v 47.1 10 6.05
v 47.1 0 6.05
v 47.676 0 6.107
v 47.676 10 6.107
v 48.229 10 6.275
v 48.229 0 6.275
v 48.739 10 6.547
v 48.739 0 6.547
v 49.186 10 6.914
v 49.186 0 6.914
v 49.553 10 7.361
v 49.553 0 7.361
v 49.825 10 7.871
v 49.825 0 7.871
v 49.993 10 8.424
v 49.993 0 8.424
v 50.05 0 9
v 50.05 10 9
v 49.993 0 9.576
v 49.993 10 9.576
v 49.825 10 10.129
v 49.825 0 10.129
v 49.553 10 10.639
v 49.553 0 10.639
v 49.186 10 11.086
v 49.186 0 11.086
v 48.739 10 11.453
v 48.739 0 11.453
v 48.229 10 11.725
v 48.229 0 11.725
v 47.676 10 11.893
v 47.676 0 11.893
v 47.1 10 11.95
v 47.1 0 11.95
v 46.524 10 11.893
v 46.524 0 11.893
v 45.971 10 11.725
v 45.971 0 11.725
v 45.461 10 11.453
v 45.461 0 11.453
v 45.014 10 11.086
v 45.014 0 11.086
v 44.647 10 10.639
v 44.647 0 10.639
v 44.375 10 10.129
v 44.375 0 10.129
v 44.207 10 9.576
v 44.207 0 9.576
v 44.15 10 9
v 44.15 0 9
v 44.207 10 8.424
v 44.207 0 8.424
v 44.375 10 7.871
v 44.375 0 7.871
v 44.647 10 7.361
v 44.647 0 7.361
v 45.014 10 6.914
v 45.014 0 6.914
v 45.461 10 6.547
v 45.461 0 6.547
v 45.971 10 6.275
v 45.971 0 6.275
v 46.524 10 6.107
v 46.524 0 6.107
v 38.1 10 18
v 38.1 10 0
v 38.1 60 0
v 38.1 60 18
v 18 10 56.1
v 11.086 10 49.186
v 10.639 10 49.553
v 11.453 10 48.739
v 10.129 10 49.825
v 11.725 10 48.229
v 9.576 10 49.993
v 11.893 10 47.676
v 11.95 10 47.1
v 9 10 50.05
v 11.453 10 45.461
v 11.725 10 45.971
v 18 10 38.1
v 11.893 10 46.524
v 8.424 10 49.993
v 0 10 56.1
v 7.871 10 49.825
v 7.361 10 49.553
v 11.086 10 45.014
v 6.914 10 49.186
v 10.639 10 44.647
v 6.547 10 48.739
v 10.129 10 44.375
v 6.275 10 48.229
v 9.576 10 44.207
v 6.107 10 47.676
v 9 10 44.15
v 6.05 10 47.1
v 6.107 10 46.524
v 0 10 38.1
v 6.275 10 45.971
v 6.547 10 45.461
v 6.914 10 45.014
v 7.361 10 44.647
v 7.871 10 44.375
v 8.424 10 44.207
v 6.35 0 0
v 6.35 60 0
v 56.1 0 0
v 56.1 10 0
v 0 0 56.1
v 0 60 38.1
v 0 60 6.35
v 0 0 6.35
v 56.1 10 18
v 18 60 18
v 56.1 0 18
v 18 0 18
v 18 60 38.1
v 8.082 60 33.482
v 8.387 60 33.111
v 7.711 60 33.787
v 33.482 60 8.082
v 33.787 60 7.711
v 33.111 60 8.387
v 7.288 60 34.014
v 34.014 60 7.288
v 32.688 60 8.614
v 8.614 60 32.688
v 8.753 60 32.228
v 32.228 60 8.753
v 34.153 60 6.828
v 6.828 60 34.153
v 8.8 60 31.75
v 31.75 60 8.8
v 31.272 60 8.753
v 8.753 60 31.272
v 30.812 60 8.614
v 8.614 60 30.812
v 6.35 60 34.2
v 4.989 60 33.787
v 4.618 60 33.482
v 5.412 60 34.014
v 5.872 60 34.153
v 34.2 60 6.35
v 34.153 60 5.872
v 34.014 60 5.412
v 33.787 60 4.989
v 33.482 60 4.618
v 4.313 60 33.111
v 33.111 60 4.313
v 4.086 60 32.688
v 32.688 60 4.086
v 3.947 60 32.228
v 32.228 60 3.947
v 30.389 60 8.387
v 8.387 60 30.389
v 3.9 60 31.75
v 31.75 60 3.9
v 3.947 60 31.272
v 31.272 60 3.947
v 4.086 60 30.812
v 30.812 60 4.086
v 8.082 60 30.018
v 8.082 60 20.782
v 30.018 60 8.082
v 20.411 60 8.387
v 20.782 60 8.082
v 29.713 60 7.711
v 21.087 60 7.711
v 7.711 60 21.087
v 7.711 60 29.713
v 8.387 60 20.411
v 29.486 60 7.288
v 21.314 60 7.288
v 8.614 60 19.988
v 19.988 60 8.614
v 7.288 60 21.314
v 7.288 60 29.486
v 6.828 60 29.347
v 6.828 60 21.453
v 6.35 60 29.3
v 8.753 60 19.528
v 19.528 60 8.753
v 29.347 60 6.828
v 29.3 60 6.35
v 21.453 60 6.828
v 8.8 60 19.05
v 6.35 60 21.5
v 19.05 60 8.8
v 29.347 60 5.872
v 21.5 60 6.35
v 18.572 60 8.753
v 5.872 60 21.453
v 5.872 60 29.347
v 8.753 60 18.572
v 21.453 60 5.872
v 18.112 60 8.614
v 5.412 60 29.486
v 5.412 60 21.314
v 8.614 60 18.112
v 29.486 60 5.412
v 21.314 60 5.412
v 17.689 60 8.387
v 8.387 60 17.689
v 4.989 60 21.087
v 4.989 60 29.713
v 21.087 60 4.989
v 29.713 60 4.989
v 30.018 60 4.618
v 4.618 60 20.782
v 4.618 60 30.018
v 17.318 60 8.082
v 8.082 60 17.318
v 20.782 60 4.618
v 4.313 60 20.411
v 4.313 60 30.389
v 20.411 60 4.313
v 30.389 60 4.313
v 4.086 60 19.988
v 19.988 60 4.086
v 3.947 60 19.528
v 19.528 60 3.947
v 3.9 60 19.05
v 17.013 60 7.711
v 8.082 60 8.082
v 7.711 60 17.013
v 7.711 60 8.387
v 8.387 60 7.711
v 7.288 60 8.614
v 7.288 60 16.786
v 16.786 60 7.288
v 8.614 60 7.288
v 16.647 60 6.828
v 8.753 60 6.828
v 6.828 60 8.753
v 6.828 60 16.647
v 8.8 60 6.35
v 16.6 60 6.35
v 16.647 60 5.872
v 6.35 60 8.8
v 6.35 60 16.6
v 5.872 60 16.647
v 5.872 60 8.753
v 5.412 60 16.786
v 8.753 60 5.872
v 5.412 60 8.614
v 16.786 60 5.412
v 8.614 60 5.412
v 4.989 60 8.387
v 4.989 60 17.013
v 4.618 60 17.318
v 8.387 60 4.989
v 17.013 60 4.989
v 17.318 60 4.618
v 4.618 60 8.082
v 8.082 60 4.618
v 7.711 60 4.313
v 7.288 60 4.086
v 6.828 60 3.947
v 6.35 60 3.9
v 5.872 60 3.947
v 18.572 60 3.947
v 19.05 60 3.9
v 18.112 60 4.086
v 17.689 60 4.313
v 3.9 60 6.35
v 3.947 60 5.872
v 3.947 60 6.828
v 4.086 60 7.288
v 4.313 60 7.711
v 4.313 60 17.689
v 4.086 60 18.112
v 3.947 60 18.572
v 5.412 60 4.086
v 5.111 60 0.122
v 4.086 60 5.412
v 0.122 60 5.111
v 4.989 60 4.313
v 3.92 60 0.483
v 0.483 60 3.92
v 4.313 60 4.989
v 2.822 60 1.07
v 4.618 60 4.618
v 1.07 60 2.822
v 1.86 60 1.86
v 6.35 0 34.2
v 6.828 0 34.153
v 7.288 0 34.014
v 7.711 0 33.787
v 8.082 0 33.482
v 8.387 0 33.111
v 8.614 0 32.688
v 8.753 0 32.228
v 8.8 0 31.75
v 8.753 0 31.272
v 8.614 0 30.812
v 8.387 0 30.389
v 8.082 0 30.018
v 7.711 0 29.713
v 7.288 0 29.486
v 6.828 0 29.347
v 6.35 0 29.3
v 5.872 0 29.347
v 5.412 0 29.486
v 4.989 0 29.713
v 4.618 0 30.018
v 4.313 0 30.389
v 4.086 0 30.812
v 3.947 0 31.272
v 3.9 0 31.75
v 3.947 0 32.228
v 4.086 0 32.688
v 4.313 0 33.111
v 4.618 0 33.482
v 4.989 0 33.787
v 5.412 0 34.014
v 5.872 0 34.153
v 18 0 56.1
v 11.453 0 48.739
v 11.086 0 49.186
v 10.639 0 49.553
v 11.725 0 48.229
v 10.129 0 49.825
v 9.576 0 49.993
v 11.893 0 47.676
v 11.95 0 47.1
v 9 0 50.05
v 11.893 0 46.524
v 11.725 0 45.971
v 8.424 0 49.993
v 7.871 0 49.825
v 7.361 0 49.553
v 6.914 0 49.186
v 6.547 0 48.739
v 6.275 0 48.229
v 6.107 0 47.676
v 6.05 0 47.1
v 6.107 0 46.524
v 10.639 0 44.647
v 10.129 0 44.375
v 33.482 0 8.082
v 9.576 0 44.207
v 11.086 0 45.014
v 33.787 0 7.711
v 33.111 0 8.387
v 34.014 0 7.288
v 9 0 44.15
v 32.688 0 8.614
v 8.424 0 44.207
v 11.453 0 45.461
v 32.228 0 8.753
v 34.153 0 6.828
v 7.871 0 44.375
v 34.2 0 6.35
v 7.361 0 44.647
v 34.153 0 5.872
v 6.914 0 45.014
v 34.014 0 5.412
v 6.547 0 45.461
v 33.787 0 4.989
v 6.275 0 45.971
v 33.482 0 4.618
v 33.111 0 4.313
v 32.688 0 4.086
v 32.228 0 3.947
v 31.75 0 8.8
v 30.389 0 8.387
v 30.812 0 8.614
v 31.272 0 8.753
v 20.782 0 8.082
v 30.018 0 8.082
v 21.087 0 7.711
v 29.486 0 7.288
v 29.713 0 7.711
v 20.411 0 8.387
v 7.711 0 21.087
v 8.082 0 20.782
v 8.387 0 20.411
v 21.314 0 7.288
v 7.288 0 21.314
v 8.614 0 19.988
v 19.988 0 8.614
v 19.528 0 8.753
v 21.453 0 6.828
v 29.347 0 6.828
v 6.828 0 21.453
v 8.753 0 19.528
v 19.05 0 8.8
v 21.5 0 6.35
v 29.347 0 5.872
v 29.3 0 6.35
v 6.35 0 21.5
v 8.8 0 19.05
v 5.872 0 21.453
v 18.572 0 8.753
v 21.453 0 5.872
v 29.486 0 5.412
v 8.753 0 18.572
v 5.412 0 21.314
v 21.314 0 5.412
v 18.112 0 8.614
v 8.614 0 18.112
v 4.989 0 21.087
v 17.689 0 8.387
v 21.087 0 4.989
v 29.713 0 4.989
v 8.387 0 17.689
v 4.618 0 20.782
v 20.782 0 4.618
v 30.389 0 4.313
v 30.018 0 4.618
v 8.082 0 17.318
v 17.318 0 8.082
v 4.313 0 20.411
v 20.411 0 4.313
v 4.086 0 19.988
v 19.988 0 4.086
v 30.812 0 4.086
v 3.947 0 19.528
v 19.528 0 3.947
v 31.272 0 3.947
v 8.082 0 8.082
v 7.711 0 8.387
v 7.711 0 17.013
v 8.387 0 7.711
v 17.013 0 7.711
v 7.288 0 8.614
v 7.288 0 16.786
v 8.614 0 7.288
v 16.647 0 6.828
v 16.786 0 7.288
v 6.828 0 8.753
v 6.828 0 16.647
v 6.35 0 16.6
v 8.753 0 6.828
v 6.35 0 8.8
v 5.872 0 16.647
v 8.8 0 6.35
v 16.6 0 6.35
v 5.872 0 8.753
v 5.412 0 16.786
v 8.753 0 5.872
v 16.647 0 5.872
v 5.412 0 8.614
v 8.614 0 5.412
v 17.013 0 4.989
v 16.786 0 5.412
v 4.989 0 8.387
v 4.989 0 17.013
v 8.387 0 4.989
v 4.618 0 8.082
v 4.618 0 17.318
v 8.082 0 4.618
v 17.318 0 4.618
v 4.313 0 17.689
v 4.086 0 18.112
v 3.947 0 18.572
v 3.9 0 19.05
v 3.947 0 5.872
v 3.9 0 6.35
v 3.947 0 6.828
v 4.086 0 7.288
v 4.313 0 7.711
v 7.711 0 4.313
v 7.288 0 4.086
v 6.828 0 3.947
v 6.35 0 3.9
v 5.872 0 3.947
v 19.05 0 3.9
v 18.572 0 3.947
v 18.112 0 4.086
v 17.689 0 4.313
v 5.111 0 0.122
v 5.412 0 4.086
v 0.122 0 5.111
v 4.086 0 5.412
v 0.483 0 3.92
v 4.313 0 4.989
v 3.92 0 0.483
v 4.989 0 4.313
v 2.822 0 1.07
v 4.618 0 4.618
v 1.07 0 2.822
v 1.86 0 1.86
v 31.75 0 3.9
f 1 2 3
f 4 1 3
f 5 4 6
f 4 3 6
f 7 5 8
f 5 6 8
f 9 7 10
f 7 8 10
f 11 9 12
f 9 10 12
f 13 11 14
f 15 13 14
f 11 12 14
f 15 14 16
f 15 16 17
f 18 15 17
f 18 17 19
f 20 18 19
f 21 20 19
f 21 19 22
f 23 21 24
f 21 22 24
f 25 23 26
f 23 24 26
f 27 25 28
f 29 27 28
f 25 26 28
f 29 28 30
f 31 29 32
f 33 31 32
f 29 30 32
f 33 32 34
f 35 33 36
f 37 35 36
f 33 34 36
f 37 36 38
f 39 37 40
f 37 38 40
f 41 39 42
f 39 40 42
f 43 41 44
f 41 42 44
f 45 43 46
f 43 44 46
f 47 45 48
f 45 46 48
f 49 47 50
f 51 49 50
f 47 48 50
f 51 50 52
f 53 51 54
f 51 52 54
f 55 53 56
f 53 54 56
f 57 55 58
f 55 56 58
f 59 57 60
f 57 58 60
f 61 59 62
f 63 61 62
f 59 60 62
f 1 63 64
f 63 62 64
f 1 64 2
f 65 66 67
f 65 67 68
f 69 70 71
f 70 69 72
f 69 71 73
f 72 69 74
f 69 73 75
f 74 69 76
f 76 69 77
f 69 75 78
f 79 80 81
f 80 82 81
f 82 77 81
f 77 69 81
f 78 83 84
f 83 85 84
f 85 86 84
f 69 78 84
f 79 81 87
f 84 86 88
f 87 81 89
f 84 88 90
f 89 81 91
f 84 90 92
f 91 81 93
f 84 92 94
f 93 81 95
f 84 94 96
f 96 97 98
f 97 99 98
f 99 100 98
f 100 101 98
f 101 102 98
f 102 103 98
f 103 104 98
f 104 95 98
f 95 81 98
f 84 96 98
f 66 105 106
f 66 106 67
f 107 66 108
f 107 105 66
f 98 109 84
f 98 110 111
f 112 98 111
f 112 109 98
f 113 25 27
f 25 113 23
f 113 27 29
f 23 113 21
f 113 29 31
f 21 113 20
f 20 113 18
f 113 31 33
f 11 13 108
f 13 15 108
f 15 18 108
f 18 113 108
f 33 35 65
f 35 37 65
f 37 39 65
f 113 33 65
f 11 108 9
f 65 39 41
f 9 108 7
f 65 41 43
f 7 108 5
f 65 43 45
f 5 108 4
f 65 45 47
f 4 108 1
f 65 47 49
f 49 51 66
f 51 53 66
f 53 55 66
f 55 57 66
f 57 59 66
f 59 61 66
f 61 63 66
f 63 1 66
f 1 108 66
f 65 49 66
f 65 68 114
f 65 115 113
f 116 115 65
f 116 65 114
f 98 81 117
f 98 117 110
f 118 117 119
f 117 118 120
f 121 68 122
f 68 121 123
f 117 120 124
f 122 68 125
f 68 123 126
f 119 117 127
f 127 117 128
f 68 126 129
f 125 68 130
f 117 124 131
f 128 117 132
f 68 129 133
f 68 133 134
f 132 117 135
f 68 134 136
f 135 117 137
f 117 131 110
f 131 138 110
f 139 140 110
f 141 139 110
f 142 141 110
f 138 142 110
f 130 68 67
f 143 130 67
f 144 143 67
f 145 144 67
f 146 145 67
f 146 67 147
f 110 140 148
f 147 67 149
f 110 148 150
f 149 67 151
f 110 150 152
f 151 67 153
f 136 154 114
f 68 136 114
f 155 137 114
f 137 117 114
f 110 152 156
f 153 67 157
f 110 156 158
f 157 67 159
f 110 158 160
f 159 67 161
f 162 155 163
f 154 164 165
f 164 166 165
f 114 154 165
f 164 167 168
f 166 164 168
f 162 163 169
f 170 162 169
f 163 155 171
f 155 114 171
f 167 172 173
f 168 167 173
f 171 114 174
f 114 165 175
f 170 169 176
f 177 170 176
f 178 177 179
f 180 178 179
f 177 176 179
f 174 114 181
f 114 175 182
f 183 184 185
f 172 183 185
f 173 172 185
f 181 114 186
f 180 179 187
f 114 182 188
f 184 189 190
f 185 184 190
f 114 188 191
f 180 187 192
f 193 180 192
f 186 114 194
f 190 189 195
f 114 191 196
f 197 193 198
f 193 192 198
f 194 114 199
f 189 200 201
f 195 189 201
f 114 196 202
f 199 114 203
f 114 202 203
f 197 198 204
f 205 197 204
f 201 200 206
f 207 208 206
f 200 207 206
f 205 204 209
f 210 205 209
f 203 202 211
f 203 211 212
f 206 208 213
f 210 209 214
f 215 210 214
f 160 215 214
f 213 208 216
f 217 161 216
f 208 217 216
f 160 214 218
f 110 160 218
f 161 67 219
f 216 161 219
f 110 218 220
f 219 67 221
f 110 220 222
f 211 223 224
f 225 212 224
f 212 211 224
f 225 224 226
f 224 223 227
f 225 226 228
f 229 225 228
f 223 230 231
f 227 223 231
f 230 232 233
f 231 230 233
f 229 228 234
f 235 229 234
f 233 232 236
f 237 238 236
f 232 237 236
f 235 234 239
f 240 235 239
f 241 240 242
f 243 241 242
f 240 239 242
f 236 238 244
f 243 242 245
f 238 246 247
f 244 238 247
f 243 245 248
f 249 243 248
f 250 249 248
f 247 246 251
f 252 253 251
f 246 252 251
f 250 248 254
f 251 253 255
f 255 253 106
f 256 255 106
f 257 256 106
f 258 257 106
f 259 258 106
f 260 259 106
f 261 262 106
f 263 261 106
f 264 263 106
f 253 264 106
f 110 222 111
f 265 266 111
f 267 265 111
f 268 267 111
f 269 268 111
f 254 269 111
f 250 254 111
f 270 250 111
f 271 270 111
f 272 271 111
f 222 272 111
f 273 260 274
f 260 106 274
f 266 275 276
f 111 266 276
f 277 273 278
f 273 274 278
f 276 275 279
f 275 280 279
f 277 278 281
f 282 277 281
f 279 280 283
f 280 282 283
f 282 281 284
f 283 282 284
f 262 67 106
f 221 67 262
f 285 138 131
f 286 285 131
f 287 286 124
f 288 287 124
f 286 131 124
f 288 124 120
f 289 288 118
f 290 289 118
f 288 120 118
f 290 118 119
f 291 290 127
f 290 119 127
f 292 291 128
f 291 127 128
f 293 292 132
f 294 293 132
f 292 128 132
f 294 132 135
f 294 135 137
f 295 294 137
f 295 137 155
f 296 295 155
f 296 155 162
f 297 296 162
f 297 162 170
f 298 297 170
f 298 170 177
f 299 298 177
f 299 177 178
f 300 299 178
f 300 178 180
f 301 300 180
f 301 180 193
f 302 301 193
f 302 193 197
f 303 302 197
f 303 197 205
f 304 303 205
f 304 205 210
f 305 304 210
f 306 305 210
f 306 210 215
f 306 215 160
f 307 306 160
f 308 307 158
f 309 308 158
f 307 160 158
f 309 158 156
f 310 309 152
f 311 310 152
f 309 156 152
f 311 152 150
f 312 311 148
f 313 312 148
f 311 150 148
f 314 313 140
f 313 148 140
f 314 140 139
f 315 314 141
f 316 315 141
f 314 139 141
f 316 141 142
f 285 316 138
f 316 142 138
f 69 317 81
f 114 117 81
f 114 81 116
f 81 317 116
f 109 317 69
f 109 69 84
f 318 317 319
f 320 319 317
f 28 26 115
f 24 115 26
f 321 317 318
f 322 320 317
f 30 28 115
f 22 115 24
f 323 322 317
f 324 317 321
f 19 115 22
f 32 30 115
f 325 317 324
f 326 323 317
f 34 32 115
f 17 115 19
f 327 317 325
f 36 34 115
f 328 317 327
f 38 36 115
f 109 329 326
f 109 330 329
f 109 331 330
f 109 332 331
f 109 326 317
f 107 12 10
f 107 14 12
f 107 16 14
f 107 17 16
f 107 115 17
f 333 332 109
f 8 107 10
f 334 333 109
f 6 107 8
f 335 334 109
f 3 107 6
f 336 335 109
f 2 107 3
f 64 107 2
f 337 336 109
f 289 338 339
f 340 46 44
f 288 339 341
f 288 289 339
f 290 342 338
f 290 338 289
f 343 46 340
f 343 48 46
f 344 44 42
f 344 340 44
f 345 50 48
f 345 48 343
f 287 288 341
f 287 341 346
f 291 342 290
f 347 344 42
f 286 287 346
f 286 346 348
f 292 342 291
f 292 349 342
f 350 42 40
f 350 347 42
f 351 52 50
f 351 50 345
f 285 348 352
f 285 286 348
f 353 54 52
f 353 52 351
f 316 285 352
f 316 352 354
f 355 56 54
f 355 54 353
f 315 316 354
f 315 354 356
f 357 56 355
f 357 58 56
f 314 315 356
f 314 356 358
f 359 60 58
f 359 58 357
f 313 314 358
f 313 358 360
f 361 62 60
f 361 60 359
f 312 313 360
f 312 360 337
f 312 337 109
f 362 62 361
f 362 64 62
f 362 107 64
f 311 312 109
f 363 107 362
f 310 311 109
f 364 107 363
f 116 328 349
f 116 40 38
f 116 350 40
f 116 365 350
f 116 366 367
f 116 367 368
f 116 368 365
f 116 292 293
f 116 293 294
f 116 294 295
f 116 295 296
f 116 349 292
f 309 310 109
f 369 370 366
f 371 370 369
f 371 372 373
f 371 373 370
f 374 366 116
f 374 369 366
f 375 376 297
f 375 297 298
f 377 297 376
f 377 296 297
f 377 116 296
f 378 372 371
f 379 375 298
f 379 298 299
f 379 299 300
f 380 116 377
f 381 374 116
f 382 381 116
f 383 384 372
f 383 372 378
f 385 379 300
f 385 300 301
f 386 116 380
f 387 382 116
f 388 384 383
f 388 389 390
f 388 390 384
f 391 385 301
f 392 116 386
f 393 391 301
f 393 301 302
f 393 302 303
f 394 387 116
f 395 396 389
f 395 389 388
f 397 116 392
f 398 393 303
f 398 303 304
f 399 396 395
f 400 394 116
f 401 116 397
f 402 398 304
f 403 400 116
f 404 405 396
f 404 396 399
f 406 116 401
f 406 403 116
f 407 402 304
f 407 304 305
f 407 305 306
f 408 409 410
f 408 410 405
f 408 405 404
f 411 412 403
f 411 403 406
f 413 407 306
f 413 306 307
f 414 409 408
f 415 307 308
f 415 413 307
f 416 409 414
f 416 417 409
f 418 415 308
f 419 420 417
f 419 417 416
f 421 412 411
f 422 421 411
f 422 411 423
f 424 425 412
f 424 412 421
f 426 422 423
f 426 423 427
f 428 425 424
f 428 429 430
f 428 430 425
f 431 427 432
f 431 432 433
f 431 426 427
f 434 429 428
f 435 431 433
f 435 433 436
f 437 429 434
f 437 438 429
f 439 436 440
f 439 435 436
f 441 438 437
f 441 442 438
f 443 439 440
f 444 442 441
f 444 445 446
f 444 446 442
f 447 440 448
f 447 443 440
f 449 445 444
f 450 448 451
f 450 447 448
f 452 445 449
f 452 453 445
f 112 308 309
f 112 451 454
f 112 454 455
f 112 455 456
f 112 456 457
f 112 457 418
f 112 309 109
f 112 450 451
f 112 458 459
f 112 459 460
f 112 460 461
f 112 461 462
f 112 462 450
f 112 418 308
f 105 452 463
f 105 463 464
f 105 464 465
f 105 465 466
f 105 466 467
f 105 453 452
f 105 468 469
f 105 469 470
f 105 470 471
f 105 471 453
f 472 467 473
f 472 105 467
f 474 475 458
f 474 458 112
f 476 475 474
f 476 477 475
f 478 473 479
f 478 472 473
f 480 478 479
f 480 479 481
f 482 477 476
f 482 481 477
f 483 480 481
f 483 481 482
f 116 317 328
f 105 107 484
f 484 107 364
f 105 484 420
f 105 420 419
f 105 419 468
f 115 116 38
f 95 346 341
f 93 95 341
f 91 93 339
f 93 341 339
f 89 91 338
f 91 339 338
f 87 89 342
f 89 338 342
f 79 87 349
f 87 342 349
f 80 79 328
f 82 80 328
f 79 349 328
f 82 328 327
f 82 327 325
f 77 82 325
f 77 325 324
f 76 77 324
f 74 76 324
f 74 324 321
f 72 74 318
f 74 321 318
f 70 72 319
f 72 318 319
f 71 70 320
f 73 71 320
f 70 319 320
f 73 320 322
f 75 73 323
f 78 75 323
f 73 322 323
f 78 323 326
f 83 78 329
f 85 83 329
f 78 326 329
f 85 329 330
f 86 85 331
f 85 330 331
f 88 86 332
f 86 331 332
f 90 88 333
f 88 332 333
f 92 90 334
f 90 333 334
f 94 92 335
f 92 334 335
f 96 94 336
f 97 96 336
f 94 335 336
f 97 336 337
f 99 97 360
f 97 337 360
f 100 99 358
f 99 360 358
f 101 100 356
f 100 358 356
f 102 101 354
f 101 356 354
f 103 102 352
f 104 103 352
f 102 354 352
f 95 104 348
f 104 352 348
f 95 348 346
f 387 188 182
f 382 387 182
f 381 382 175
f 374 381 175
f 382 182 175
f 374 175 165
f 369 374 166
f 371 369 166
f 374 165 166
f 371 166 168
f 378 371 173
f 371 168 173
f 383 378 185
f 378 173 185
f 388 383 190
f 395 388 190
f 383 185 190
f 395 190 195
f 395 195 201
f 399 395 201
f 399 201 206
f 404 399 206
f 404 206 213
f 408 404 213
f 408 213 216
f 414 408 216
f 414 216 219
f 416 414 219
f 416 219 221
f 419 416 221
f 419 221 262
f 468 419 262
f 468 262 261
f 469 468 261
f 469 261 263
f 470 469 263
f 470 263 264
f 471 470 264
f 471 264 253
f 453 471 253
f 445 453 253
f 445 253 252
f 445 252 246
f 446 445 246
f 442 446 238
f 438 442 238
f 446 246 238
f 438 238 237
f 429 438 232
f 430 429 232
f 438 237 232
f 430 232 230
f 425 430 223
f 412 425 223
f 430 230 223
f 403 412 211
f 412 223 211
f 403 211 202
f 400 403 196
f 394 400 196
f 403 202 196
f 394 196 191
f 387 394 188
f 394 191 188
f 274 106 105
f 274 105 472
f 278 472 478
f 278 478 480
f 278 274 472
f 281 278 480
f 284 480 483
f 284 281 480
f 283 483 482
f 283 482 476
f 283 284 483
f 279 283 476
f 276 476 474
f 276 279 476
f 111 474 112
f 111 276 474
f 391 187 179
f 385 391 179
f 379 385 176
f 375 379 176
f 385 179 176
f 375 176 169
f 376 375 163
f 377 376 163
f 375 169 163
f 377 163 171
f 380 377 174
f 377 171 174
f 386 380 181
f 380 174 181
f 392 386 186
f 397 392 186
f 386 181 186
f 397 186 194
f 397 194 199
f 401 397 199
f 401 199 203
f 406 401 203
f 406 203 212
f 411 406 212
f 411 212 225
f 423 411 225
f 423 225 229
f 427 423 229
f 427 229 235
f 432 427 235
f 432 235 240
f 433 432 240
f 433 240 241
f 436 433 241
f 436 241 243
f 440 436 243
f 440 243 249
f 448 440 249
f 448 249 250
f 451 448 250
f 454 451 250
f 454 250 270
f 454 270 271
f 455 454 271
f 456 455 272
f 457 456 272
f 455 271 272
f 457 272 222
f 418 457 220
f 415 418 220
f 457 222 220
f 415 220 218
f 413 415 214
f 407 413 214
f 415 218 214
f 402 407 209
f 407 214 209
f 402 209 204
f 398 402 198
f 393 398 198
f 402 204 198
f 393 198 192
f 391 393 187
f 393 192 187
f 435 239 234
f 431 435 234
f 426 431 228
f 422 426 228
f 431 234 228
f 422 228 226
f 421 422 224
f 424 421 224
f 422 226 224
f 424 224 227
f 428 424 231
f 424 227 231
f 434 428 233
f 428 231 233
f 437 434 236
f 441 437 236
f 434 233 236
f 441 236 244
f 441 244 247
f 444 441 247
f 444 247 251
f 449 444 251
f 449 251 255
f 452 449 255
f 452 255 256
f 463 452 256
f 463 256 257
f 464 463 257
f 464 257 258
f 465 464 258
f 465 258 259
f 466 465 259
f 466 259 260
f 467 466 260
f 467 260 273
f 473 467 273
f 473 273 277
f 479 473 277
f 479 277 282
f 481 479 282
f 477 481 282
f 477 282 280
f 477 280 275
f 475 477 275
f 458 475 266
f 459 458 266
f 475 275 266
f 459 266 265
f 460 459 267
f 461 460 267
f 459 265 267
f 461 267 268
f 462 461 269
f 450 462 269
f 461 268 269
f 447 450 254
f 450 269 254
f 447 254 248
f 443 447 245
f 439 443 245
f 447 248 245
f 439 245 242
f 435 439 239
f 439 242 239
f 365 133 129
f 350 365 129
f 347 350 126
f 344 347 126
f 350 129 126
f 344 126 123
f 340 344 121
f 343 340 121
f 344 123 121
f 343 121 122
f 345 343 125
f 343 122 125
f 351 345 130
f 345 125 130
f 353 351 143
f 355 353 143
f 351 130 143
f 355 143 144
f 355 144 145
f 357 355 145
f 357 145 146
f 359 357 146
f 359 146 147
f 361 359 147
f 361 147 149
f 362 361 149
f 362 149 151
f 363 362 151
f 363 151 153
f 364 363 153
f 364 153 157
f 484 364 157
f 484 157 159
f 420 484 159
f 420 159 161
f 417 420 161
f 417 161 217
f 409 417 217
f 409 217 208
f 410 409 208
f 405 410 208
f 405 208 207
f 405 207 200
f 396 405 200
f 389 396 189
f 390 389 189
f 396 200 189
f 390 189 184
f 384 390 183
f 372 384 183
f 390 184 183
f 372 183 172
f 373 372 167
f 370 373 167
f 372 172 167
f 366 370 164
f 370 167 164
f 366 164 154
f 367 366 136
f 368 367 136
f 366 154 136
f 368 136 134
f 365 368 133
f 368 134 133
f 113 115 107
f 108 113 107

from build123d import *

# Parameters (mm, degrees)
BOSS_EXTRUDE1_DEPTH = 60
SKETCH2_R           = 2.45
CUT_EXTRUDE1_DEPTH  = 81.642544603
CUT_EXTRUDE2_DEPTH  = 81.642544603
SKETCH4_W           = 18
SKETCH4_H           = 18
SKETCH4_R           = 2.95
BOSS_EXTRUDE2_DEPTH = 10


with BuildPart() as part:
    # Sketch1 → Boss-Extrude1 (new body)
    with BuildSketch(Plane(origin=(0, 0, 0), x_dir=(1, 0, 0), z_dir=(0, 1, 0))):
        Polygon((0, 0), (38.1, 0), (38.1, -18), (18, -18), (18, -38.1), (0, -38.1), align=None)
    extrude(amount=BOSS_EXTRUDE1_DEPTH)

    # Sketch2 → Cut-Extrude1 (cut, through all)
    with BuildSketch(Plane(origin=(0, 60, 0), x_dir=(1, 0, 0), z_dir=(0, 1, 0))):
        with Locations(Location((6.35, -6.35, 0), (0, 0, 270))):
            Circle(SKETCH2_R)
        with Locations(Location((6.35, -19.05, 0), (0, 0, 270))):
            Circle(SKETCH2_R)
        with Locations(Location((6.35, -31.75, 0), (0, 0, 270))):
            Circle(SKETCH2_R)
        with Locations(Location((19.05, -6.35, 0), (0, 0, 270))):
            Circle(SKETCH2_R)
        with Locations(Location((31.75, -6.35, 0), (0, 0, 270))):
            Circle(SKETCH2_R)
    extrude(amount=-CUT_EXTRUDE1_DEPTH, mode=Mode.SUBTRACT)

    # Sketch3 → Cut-Extrude2 (cut, through all)
    with BuildSketch(Plane(origin=(0, 60, 0), x_dir=(1, 0, 0), z_dir=(0, 1, 0))):
        with BuildLine():
            Line((0, -6.35), (-3.023343313, -6.35))
            Line((-3.023343313, -6.35), (-3.023343313, 2.931868043))
            Line((-3.023343313, 2.931868043), (6.35, 2.931868043))
            Line((6.35, 2.931868043), (6.35, 0))
            ThreePointArc((6.35, 0), (1.859871939, -1.859871939), (0, -6.35))
        make_face()
    extrude(amount=-CUT_EXTRUDE2_DEPTH, mode=Mode.SUBTRACT)

    # Sketch4 → Boss-Extrude2 (add)
    # profile 1 of 2: a face of its own
    with BuildSketch(Plane(origin=(0, 0, 0), x_dir=(-1, 0, 0), z_dir=(0, -1, 0))):
        with Locations((-9, -47.1)):
            Rectangle(SKETCH4_W, SKETCH4_H)
        with Locations(Location((-9, -47.1, 0), (0, 0, 90))):
            Circle(SKETCH4_R, mode=Mode.SUBTRACT)
    # profile 2 of 2: a face of its own
    with BuildSketch(Plane(origin=(0, 0, 0), x_dir=(-1, 0, 0), z_dir=(0, -1, 0))):
        with Locations((-47.1, -9)):
            Rectangle(SKETCH4_W, SKETCH4_H)
        with Locations(Location((-47.1, -9, 0), (0, 0, 90))):
            Circle(SKETCH4_R, mode=Mode.SUBTRACT)
    extrude(amount=-BOSS_EXTRUDE2_DEPTH)


solid = part.part
